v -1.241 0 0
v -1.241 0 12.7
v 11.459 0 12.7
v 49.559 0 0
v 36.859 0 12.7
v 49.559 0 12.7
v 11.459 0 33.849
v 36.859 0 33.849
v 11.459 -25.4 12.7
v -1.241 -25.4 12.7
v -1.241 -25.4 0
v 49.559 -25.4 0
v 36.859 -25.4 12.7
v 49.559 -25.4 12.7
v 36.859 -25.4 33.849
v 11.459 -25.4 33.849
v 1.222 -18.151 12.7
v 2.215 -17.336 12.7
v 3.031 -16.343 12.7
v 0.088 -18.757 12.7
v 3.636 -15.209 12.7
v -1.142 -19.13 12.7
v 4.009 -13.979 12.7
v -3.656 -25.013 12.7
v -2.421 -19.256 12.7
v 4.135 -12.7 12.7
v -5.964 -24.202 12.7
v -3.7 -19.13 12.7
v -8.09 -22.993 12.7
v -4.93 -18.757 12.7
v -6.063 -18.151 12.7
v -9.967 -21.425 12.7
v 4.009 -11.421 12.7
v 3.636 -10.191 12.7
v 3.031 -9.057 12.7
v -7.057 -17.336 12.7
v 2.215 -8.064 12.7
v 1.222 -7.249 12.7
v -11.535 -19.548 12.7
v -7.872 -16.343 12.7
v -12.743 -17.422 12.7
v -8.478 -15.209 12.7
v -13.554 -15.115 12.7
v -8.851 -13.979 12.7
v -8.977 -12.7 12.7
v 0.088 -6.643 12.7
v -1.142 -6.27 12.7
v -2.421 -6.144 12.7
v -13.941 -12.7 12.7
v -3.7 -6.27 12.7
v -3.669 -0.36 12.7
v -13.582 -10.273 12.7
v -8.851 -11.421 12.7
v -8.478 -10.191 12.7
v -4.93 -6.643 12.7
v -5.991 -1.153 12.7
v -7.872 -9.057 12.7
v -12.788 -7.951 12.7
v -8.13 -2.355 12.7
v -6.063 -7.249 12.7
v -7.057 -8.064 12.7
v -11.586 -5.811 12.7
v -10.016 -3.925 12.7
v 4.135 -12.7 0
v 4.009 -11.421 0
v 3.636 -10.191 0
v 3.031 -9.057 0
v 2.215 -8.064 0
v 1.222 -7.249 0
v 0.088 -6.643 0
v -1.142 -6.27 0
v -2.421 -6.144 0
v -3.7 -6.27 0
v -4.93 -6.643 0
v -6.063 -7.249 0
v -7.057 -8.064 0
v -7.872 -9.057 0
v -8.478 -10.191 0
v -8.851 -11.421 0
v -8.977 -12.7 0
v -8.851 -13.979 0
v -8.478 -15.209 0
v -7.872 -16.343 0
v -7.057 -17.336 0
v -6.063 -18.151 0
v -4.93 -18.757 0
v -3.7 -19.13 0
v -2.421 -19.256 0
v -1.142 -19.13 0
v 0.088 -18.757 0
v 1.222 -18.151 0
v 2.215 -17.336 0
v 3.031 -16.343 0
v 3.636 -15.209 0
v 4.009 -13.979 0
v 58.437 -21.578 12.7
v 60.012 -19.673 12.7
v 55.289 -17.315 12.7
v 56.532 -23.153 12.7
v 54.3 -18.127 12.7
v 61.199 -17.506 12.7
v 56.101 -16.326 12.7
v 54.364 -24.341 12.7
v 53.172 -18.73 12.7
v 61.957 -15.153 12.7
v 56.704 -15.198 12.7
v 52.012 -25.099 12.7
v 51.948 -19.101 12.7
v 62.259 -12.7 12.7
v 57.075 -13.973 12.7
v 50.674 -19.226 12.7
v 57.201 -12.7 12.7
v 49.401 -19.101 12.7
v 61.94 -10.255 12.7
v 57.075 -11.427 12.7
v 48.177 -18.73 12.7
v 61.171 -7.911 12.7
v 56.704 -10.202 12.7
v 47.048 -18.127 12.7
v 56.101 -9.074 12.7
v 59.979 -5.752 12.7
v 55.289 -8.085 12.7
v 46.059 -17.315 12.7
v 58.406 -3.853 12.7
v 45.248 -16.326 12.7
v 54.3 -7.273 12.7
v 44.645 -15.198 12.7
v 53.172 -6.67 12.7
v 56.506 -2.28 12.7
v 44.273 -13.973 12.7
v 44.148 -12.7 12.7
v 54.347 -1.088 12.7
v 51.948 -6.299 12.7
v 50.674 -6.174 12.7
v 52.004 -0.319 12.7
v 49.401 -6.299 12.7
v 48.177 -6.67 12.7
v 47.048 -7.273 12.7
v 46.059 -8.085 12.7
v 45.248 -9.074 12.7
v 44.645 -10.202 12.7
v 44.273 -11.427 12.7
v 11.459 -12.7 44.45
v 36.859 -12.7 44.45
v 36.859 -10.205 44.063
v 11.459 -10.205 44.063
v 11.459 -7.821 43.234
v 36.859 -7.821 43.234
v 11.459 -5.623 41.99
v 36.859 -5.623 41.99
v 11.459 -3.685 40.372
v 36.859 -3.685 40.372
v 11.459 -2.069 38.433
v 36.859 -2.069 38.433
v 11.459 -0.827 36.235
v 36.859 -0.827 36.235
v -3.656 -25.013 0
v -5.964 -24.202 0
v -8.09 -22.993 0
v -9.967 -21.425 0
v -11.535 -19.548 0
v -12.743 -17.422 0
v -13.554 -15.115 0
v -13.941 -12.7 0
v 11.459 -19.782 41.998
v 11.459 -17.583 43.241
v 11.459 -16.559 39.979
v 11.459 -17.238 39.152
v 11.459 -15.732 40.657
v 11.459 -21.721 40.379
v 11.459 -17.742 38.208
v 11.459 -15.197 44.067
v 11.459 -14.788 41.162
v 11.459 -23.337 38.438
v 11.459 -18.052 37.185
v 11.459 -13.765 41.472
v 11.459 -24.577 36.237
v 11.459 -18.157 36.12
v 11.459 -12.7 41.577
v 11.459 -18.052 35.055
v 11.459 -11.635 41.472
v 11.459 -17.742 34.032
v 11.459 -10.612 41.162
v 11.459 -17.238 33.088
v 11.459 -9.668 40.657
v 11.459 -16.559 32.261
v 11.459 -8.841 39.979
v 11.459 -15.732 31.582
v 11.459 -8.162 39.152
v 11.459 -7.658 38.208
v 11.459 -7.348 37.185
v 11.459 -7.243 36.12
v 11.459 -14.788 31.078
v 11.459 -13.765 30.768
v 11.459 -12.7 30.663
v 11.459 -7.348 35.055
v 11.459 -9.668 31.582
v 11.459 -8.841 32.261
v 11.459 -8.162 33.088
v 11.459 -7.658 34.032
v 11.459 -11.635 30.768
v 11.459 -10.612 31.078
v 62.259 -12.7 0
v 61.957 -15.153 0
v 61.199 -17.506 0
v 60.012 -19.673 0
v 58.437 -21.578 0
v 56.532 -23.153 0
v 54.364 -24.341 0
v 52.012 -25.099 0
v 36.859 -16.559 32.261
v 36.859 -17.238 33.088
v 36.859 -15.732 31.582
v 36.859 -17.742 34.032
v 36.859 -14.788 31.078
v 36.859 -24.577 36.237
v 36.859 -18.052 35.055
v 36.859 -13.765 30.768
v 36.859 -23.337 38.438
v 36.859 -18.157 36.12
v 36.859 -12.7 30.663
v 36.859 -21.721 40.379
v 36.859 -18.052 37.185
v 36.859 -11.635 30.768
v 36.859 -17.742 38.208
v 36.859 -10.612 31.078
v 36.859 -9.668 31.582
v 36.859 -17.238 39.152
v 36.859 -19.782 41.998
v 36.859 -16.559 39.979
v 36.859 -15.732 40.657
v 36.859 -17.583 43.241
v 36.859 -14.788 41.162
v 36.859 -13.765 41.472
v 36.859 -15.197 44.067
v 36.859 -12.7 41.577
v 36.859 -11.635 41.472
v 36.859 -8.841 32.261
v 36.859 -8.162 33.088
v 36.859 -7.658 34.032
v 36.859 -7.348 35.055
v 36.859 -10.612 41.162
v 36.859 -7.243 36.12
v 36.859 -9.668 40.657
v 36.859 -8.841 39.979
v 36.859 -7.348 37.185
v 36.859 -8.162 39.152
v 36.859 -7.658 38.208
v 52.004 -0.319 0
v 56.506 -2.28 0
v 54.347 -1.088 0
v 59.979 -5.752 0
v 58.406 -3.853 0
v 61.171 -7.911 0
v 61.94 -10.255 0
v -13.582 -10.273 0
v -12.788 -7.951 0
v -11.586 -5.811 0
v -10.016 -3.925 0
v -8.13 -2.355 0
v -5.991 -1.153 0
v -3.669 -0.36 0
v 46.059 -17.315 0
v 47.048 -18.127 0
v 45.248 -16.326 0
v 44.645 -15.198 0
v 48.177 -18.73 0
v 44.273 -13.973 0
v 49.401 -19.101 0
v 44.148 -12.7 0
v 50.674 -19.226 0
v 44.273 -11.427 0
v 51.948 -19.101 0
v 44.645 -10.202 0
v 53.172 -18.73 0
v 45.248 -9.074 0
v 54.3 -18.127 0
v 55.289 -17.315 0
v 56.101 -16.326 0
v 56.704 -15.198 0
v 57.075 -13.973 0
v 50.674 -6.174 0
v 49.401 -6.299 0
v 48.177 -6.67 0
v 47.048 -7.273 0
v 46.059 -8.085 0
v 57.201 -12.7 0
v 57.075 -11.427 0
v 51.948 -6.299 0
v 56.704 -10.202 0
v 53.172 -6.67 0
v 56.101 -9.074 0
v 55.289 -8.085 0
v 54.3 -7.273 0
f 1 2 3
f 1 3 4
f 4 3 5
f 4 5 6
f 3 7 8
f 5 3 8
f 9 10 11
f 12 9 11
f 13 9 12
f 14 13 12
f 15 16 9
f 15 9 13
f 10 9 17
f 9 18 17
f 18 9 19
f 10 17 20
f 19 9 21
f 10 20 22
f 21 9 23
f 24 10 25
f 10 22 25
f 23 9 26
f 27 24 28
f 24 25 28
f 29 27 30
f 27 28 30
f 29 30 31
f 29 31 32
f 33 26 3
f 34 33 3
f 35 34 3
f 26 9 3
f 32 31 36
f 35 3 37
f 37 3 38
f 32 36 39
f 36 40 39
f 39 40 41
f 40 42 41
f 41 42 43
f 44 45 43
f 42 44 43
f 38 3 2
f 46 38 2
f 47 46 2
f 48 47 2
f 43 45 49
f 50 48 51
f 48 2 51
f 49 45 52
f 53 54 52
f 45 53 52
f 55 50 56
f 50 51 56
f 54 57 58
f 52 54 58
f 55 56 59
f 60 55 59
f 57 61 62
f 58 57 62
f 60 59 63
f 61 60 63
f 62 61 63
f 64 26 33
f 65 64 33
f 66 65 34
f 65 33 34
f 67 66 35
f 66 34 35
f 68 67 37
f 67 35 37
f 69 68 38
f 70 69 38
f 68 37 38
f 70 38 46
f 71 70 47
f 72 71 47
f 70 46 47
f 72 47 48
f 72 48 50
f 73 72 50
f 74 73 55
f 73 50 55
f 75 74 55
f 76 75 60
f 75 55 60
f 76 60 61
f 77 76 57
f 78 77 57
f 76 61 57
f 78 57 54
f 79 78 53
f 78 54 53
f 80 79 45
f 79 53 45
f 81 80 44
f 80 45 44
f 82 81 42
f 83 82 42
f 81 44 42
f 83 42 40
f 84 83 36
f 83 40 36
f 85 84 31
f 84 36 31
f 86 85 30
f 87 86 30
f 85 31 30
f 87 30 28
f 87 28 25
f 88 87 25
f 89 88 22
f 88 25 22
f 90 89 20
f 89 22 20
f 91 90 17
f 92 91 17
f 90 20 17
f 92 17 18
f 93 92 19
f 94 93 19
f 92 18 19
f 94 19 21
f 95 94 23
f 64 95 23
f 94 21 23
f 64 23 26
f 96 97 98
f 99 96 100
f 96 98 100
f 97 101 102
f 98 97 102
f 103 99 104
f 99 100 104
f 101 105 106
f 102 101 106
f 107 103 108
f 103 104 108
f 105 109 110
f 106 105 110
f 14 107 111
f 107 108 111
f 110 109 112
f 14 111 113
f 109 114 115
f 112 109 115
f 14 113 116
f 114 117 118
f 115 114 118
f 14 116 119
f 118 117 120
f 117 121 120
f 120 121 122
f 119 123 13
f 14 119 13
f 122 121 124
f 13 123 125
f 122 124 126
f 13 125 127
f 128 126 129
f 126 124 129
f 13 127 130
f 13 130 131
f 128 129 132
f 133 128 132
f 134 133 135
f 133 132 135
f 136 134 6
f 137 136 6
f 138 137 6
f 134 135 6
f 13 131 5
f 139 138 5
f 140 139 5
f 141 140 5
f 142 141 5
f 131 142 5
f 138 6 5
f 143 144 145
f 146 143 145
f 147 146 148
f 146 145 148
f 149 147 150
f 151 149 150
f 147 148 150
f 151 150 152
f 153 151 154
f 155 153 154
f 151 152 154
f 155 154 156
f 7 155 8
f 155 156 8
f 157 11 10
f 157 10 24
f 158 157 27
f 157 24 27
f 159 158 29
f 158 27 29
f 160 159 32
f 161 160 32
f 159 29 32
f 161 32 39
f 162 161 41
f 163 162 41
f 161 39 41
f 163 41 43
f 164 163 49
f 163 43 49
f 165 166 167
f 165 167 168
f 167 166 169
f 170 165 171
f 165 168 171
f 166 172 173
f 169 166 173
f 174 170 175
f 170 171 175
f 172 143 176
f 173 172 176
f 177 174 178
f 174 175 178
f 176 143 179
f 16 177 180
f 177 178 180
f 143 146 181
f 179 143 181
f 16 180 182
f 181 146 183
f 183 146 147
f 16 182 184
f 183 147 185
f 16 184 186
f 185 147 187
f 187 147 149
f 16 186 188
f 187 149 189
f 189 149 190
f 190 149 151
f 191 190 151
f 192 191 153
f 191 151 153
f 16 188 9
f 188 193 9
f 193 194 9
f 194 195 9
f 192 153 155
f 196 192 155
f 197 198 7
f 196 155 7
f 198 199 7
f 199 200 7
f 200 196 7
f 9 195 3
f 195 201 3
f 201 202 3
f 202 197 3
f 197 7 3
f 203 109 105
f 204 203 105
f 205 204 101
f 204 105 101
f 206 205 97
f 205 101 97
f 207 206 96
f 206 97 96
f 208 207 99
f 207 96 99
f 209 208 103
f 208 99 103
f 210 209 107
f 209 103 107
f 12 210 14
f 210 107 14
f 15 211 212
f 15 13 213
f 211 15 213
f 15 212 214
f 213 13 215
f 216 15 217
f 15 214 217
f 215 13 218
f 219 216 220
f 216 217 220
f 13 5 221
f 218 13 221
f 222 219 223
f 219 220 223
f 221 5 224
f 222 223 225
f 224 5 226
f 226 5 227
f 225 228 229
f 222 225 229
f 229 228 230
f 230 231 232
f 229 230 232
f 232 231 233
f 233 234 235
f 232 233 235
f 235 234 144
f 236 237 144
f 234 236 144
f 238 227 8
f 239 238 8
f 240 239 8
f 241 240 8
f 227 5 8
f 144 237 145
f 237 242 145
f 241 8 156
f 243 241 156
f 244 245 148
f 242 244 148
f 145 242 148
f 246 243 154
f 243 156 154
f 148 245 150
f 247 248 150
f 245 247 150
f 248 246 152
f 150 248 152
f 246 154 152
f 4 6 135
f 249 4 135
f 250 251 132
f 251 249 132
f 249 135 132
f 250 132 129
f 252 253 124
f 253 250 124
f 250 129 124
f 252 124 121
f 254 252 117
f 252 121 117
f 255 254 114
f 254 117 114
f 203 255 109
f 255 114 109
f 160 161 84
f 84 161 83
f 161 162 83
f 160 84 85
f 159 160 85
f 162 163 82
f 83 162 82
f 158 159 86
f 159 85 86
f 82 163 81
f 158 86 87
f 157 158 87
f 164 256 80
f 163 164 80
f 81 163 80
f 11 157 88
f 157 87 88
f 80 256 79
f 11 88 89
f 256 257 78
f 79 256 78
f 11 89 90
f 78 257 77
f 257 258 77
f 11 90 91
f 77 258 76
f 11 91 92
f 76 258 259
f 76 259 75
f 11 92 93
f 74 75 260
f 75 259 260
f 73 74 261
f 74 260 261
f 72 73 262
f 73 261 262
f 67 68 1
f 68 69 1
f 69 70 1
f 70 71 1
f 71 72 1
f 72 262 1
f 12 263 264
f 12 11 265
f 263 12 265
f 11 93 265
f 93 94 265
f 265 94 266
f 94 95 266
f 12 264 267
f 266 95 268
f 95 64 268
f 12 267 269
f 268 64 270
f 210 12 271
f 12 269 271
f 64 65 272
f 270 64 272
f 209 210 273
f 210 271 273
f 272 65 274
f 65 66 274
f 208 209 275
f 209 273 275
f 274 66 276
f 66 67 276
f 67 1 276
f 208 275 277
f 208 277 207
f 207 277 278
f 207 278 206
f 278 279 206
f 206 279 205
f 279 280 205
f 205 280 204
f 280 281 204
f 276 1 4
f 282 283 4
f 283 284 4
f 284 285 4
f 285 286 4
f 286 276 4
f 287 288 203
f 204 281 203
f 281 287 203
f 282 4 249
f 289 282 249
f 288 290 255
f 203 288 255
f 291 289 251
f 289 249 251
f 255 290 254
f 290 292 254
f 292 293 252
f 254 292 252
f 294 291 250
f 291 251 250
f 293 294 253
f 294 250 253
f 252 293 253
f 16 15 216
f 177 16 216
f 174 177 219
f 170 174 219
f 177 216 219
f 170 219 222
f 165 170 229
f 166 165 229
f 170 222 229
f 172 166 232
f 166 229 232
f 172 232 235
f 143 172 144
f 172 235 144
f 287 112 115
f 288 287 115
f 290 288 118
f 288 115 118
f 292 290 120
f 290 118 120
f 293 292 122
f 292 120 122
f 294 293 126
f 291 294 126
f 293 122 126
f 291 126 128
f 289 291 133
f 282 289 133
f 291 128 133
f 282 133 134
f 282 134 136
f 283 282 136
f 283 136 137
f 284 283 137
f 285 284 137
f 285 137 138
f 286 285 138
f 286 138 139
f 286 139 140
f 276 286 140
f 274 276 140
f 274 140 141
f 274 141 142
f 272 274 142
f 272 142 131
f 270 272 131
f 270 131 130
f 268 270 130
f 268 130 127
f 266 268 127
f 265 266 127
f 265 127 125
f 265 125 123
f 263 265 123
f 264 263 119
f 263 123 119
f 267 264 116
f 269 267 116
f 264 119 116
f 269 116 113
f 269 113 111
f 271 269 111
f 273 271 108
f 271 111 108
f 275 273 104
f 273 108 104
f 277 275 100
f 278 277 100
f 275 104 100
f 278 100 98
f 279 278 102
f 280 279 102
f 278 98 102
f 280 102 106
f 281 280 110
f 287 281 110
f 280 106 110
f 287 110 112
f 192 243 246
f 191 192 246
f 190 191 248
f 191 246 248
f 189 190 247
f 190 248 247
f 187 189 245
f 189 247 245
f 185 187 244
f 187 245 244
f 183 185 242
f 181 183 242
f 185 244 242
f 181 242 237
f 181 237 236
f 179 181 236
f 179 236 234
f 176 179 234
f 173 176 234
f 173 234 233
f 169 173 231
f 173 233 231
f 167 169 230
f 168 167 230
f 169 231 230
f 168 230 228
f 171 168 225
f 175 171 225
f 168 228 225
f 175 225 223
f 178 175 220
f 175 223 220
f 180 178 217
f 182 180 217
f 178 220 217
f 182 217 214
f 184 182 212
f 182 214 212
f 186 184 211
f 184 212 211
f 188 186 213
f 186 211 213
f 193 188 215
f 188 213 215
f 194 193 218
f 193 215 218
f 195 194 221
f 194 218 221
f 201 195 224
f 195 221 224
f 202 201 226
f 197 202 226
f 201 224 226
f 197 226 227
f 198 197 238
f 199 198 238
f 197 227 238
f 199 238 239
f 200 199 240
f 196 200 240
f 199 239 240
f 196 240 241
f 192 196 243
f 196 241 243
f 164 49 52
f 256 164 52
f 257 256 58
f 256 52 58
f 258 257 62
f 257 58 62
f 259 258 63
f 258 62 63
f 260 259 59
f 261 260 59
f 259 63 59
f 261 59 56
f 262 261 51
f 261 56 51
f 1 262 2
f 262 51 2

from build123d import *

# Parameters (mm, degrees)
F1_DEPTH = 25.4
F3_DEPTH = 25.4
F4_R     = 5.457243
F5_DEPTH = 25.4
F6_R     = 6.556399
F7_DEPTH = 12.7
F8_R     = 6.526479
F9_DEPTH = 25.4


with BuildPart() as f1:
    # F0 (on Front) → F1 (new body)
    with BuildSketch(Plane.XZ):
        Polygon((-13.941352, 12.7), (-13.941352, 0), (62.258648, 0), (62.258648, 12.7), (36.858648, 12.7), (36.858648, 44.45), (11.458648, 44.45), (11.458648, 12.7), align=None)
    extrude(amount=F1_DEPTH)

    # F2 (on face) → F3 (cut)
    with BuildSketch(Plane.YZ.offset(36.858648)):
        with BuildLine():
            ThreePointArc((-25.4, 33.849411), (-20.7886, 41.232629), (-12.7, 44.45))
            Line((-12.7, 44.45), (-25.4, 44.45))
            Line((-25.4, 44.45), (-25.4, 33.849411))
        make_face()
        with BuildLine():
            Line((0, 44.45), (-12.7, 44.45))
            ThreePointArc((-12.7, 44.45), (-4.617872, 41.224876), (0, 33.849411))
            Line((0, 33.849411), (0, 44.45))
        make_face()
    extrude(amount=-F3_DEPTH, mode=Mode.SUBTRACT)

    # F4 (on face) → F5 (cut)
    with BuildSketch(Plane.YZ.offset(36.858648)):
        with Locations((-12.7, 36.11993)):
            Circle(F4_R)
    extrude(amount=-F5_DEPTH, mode=Mode.SUBTRACT)

    # F6 (on face) → F7 (cut)
    with BuildSketch(Plane.XY.offset(12.7)):
        with BuildLine():
            Line((-13.941352, 0), (-13.941352, -12.7))
            ThreePointArc((-13.941352, -12.7), (-10.016193, -3.925159), (-1.241352, 0))
            Line((-1.241352, 0), (-13.941352, 0))
        make_face()
        with BuildLine():
            ThreePointArc((-1.241352, -25.4), (-9.966637, -21.425286), (-13.941352, -12.7))
            Line((-13.941352, -12.7), (-13.941352, -25.4))
            Line((-13.941352, -25.4), (-1.241352, -25.4))
        make_face()
        with Locations((-2.420933, -12.7)):
            Circle(F6_R)
    extrude(amount=-F7_DEPTH, mode=Mode.SUBTRACT)

    # F8 (on face) → F9 (cut)
    with BuildSketch(Plane.XY.offset(12.7)):
        with Locations((50.674323, -12.7)):
            Circle(F8_R)
        with BuildLine():
            ThreePointArc((49.558648, 0), (58.40559, -3.853059), (62.258648, -12.7))
            Line((62.258648, -12.7), (62.258648, 0))
            Line((62.258648, 0), (49.558648, 0))
        make_face()
        with BuildLine():
            Line((62.258648, -25.4), (62.258648, -12.7))
            ThreePointArc((62.258648, -12.7), (58.437118, -21.57847), (49.558648, -25.4))
            Line((49.558648, -25.4), (62.258648, -25.4))
        make_face()
    extrude(amount=-F9_DEPTH, mode=Mode.SUBTRACT)


solid = f1.part
